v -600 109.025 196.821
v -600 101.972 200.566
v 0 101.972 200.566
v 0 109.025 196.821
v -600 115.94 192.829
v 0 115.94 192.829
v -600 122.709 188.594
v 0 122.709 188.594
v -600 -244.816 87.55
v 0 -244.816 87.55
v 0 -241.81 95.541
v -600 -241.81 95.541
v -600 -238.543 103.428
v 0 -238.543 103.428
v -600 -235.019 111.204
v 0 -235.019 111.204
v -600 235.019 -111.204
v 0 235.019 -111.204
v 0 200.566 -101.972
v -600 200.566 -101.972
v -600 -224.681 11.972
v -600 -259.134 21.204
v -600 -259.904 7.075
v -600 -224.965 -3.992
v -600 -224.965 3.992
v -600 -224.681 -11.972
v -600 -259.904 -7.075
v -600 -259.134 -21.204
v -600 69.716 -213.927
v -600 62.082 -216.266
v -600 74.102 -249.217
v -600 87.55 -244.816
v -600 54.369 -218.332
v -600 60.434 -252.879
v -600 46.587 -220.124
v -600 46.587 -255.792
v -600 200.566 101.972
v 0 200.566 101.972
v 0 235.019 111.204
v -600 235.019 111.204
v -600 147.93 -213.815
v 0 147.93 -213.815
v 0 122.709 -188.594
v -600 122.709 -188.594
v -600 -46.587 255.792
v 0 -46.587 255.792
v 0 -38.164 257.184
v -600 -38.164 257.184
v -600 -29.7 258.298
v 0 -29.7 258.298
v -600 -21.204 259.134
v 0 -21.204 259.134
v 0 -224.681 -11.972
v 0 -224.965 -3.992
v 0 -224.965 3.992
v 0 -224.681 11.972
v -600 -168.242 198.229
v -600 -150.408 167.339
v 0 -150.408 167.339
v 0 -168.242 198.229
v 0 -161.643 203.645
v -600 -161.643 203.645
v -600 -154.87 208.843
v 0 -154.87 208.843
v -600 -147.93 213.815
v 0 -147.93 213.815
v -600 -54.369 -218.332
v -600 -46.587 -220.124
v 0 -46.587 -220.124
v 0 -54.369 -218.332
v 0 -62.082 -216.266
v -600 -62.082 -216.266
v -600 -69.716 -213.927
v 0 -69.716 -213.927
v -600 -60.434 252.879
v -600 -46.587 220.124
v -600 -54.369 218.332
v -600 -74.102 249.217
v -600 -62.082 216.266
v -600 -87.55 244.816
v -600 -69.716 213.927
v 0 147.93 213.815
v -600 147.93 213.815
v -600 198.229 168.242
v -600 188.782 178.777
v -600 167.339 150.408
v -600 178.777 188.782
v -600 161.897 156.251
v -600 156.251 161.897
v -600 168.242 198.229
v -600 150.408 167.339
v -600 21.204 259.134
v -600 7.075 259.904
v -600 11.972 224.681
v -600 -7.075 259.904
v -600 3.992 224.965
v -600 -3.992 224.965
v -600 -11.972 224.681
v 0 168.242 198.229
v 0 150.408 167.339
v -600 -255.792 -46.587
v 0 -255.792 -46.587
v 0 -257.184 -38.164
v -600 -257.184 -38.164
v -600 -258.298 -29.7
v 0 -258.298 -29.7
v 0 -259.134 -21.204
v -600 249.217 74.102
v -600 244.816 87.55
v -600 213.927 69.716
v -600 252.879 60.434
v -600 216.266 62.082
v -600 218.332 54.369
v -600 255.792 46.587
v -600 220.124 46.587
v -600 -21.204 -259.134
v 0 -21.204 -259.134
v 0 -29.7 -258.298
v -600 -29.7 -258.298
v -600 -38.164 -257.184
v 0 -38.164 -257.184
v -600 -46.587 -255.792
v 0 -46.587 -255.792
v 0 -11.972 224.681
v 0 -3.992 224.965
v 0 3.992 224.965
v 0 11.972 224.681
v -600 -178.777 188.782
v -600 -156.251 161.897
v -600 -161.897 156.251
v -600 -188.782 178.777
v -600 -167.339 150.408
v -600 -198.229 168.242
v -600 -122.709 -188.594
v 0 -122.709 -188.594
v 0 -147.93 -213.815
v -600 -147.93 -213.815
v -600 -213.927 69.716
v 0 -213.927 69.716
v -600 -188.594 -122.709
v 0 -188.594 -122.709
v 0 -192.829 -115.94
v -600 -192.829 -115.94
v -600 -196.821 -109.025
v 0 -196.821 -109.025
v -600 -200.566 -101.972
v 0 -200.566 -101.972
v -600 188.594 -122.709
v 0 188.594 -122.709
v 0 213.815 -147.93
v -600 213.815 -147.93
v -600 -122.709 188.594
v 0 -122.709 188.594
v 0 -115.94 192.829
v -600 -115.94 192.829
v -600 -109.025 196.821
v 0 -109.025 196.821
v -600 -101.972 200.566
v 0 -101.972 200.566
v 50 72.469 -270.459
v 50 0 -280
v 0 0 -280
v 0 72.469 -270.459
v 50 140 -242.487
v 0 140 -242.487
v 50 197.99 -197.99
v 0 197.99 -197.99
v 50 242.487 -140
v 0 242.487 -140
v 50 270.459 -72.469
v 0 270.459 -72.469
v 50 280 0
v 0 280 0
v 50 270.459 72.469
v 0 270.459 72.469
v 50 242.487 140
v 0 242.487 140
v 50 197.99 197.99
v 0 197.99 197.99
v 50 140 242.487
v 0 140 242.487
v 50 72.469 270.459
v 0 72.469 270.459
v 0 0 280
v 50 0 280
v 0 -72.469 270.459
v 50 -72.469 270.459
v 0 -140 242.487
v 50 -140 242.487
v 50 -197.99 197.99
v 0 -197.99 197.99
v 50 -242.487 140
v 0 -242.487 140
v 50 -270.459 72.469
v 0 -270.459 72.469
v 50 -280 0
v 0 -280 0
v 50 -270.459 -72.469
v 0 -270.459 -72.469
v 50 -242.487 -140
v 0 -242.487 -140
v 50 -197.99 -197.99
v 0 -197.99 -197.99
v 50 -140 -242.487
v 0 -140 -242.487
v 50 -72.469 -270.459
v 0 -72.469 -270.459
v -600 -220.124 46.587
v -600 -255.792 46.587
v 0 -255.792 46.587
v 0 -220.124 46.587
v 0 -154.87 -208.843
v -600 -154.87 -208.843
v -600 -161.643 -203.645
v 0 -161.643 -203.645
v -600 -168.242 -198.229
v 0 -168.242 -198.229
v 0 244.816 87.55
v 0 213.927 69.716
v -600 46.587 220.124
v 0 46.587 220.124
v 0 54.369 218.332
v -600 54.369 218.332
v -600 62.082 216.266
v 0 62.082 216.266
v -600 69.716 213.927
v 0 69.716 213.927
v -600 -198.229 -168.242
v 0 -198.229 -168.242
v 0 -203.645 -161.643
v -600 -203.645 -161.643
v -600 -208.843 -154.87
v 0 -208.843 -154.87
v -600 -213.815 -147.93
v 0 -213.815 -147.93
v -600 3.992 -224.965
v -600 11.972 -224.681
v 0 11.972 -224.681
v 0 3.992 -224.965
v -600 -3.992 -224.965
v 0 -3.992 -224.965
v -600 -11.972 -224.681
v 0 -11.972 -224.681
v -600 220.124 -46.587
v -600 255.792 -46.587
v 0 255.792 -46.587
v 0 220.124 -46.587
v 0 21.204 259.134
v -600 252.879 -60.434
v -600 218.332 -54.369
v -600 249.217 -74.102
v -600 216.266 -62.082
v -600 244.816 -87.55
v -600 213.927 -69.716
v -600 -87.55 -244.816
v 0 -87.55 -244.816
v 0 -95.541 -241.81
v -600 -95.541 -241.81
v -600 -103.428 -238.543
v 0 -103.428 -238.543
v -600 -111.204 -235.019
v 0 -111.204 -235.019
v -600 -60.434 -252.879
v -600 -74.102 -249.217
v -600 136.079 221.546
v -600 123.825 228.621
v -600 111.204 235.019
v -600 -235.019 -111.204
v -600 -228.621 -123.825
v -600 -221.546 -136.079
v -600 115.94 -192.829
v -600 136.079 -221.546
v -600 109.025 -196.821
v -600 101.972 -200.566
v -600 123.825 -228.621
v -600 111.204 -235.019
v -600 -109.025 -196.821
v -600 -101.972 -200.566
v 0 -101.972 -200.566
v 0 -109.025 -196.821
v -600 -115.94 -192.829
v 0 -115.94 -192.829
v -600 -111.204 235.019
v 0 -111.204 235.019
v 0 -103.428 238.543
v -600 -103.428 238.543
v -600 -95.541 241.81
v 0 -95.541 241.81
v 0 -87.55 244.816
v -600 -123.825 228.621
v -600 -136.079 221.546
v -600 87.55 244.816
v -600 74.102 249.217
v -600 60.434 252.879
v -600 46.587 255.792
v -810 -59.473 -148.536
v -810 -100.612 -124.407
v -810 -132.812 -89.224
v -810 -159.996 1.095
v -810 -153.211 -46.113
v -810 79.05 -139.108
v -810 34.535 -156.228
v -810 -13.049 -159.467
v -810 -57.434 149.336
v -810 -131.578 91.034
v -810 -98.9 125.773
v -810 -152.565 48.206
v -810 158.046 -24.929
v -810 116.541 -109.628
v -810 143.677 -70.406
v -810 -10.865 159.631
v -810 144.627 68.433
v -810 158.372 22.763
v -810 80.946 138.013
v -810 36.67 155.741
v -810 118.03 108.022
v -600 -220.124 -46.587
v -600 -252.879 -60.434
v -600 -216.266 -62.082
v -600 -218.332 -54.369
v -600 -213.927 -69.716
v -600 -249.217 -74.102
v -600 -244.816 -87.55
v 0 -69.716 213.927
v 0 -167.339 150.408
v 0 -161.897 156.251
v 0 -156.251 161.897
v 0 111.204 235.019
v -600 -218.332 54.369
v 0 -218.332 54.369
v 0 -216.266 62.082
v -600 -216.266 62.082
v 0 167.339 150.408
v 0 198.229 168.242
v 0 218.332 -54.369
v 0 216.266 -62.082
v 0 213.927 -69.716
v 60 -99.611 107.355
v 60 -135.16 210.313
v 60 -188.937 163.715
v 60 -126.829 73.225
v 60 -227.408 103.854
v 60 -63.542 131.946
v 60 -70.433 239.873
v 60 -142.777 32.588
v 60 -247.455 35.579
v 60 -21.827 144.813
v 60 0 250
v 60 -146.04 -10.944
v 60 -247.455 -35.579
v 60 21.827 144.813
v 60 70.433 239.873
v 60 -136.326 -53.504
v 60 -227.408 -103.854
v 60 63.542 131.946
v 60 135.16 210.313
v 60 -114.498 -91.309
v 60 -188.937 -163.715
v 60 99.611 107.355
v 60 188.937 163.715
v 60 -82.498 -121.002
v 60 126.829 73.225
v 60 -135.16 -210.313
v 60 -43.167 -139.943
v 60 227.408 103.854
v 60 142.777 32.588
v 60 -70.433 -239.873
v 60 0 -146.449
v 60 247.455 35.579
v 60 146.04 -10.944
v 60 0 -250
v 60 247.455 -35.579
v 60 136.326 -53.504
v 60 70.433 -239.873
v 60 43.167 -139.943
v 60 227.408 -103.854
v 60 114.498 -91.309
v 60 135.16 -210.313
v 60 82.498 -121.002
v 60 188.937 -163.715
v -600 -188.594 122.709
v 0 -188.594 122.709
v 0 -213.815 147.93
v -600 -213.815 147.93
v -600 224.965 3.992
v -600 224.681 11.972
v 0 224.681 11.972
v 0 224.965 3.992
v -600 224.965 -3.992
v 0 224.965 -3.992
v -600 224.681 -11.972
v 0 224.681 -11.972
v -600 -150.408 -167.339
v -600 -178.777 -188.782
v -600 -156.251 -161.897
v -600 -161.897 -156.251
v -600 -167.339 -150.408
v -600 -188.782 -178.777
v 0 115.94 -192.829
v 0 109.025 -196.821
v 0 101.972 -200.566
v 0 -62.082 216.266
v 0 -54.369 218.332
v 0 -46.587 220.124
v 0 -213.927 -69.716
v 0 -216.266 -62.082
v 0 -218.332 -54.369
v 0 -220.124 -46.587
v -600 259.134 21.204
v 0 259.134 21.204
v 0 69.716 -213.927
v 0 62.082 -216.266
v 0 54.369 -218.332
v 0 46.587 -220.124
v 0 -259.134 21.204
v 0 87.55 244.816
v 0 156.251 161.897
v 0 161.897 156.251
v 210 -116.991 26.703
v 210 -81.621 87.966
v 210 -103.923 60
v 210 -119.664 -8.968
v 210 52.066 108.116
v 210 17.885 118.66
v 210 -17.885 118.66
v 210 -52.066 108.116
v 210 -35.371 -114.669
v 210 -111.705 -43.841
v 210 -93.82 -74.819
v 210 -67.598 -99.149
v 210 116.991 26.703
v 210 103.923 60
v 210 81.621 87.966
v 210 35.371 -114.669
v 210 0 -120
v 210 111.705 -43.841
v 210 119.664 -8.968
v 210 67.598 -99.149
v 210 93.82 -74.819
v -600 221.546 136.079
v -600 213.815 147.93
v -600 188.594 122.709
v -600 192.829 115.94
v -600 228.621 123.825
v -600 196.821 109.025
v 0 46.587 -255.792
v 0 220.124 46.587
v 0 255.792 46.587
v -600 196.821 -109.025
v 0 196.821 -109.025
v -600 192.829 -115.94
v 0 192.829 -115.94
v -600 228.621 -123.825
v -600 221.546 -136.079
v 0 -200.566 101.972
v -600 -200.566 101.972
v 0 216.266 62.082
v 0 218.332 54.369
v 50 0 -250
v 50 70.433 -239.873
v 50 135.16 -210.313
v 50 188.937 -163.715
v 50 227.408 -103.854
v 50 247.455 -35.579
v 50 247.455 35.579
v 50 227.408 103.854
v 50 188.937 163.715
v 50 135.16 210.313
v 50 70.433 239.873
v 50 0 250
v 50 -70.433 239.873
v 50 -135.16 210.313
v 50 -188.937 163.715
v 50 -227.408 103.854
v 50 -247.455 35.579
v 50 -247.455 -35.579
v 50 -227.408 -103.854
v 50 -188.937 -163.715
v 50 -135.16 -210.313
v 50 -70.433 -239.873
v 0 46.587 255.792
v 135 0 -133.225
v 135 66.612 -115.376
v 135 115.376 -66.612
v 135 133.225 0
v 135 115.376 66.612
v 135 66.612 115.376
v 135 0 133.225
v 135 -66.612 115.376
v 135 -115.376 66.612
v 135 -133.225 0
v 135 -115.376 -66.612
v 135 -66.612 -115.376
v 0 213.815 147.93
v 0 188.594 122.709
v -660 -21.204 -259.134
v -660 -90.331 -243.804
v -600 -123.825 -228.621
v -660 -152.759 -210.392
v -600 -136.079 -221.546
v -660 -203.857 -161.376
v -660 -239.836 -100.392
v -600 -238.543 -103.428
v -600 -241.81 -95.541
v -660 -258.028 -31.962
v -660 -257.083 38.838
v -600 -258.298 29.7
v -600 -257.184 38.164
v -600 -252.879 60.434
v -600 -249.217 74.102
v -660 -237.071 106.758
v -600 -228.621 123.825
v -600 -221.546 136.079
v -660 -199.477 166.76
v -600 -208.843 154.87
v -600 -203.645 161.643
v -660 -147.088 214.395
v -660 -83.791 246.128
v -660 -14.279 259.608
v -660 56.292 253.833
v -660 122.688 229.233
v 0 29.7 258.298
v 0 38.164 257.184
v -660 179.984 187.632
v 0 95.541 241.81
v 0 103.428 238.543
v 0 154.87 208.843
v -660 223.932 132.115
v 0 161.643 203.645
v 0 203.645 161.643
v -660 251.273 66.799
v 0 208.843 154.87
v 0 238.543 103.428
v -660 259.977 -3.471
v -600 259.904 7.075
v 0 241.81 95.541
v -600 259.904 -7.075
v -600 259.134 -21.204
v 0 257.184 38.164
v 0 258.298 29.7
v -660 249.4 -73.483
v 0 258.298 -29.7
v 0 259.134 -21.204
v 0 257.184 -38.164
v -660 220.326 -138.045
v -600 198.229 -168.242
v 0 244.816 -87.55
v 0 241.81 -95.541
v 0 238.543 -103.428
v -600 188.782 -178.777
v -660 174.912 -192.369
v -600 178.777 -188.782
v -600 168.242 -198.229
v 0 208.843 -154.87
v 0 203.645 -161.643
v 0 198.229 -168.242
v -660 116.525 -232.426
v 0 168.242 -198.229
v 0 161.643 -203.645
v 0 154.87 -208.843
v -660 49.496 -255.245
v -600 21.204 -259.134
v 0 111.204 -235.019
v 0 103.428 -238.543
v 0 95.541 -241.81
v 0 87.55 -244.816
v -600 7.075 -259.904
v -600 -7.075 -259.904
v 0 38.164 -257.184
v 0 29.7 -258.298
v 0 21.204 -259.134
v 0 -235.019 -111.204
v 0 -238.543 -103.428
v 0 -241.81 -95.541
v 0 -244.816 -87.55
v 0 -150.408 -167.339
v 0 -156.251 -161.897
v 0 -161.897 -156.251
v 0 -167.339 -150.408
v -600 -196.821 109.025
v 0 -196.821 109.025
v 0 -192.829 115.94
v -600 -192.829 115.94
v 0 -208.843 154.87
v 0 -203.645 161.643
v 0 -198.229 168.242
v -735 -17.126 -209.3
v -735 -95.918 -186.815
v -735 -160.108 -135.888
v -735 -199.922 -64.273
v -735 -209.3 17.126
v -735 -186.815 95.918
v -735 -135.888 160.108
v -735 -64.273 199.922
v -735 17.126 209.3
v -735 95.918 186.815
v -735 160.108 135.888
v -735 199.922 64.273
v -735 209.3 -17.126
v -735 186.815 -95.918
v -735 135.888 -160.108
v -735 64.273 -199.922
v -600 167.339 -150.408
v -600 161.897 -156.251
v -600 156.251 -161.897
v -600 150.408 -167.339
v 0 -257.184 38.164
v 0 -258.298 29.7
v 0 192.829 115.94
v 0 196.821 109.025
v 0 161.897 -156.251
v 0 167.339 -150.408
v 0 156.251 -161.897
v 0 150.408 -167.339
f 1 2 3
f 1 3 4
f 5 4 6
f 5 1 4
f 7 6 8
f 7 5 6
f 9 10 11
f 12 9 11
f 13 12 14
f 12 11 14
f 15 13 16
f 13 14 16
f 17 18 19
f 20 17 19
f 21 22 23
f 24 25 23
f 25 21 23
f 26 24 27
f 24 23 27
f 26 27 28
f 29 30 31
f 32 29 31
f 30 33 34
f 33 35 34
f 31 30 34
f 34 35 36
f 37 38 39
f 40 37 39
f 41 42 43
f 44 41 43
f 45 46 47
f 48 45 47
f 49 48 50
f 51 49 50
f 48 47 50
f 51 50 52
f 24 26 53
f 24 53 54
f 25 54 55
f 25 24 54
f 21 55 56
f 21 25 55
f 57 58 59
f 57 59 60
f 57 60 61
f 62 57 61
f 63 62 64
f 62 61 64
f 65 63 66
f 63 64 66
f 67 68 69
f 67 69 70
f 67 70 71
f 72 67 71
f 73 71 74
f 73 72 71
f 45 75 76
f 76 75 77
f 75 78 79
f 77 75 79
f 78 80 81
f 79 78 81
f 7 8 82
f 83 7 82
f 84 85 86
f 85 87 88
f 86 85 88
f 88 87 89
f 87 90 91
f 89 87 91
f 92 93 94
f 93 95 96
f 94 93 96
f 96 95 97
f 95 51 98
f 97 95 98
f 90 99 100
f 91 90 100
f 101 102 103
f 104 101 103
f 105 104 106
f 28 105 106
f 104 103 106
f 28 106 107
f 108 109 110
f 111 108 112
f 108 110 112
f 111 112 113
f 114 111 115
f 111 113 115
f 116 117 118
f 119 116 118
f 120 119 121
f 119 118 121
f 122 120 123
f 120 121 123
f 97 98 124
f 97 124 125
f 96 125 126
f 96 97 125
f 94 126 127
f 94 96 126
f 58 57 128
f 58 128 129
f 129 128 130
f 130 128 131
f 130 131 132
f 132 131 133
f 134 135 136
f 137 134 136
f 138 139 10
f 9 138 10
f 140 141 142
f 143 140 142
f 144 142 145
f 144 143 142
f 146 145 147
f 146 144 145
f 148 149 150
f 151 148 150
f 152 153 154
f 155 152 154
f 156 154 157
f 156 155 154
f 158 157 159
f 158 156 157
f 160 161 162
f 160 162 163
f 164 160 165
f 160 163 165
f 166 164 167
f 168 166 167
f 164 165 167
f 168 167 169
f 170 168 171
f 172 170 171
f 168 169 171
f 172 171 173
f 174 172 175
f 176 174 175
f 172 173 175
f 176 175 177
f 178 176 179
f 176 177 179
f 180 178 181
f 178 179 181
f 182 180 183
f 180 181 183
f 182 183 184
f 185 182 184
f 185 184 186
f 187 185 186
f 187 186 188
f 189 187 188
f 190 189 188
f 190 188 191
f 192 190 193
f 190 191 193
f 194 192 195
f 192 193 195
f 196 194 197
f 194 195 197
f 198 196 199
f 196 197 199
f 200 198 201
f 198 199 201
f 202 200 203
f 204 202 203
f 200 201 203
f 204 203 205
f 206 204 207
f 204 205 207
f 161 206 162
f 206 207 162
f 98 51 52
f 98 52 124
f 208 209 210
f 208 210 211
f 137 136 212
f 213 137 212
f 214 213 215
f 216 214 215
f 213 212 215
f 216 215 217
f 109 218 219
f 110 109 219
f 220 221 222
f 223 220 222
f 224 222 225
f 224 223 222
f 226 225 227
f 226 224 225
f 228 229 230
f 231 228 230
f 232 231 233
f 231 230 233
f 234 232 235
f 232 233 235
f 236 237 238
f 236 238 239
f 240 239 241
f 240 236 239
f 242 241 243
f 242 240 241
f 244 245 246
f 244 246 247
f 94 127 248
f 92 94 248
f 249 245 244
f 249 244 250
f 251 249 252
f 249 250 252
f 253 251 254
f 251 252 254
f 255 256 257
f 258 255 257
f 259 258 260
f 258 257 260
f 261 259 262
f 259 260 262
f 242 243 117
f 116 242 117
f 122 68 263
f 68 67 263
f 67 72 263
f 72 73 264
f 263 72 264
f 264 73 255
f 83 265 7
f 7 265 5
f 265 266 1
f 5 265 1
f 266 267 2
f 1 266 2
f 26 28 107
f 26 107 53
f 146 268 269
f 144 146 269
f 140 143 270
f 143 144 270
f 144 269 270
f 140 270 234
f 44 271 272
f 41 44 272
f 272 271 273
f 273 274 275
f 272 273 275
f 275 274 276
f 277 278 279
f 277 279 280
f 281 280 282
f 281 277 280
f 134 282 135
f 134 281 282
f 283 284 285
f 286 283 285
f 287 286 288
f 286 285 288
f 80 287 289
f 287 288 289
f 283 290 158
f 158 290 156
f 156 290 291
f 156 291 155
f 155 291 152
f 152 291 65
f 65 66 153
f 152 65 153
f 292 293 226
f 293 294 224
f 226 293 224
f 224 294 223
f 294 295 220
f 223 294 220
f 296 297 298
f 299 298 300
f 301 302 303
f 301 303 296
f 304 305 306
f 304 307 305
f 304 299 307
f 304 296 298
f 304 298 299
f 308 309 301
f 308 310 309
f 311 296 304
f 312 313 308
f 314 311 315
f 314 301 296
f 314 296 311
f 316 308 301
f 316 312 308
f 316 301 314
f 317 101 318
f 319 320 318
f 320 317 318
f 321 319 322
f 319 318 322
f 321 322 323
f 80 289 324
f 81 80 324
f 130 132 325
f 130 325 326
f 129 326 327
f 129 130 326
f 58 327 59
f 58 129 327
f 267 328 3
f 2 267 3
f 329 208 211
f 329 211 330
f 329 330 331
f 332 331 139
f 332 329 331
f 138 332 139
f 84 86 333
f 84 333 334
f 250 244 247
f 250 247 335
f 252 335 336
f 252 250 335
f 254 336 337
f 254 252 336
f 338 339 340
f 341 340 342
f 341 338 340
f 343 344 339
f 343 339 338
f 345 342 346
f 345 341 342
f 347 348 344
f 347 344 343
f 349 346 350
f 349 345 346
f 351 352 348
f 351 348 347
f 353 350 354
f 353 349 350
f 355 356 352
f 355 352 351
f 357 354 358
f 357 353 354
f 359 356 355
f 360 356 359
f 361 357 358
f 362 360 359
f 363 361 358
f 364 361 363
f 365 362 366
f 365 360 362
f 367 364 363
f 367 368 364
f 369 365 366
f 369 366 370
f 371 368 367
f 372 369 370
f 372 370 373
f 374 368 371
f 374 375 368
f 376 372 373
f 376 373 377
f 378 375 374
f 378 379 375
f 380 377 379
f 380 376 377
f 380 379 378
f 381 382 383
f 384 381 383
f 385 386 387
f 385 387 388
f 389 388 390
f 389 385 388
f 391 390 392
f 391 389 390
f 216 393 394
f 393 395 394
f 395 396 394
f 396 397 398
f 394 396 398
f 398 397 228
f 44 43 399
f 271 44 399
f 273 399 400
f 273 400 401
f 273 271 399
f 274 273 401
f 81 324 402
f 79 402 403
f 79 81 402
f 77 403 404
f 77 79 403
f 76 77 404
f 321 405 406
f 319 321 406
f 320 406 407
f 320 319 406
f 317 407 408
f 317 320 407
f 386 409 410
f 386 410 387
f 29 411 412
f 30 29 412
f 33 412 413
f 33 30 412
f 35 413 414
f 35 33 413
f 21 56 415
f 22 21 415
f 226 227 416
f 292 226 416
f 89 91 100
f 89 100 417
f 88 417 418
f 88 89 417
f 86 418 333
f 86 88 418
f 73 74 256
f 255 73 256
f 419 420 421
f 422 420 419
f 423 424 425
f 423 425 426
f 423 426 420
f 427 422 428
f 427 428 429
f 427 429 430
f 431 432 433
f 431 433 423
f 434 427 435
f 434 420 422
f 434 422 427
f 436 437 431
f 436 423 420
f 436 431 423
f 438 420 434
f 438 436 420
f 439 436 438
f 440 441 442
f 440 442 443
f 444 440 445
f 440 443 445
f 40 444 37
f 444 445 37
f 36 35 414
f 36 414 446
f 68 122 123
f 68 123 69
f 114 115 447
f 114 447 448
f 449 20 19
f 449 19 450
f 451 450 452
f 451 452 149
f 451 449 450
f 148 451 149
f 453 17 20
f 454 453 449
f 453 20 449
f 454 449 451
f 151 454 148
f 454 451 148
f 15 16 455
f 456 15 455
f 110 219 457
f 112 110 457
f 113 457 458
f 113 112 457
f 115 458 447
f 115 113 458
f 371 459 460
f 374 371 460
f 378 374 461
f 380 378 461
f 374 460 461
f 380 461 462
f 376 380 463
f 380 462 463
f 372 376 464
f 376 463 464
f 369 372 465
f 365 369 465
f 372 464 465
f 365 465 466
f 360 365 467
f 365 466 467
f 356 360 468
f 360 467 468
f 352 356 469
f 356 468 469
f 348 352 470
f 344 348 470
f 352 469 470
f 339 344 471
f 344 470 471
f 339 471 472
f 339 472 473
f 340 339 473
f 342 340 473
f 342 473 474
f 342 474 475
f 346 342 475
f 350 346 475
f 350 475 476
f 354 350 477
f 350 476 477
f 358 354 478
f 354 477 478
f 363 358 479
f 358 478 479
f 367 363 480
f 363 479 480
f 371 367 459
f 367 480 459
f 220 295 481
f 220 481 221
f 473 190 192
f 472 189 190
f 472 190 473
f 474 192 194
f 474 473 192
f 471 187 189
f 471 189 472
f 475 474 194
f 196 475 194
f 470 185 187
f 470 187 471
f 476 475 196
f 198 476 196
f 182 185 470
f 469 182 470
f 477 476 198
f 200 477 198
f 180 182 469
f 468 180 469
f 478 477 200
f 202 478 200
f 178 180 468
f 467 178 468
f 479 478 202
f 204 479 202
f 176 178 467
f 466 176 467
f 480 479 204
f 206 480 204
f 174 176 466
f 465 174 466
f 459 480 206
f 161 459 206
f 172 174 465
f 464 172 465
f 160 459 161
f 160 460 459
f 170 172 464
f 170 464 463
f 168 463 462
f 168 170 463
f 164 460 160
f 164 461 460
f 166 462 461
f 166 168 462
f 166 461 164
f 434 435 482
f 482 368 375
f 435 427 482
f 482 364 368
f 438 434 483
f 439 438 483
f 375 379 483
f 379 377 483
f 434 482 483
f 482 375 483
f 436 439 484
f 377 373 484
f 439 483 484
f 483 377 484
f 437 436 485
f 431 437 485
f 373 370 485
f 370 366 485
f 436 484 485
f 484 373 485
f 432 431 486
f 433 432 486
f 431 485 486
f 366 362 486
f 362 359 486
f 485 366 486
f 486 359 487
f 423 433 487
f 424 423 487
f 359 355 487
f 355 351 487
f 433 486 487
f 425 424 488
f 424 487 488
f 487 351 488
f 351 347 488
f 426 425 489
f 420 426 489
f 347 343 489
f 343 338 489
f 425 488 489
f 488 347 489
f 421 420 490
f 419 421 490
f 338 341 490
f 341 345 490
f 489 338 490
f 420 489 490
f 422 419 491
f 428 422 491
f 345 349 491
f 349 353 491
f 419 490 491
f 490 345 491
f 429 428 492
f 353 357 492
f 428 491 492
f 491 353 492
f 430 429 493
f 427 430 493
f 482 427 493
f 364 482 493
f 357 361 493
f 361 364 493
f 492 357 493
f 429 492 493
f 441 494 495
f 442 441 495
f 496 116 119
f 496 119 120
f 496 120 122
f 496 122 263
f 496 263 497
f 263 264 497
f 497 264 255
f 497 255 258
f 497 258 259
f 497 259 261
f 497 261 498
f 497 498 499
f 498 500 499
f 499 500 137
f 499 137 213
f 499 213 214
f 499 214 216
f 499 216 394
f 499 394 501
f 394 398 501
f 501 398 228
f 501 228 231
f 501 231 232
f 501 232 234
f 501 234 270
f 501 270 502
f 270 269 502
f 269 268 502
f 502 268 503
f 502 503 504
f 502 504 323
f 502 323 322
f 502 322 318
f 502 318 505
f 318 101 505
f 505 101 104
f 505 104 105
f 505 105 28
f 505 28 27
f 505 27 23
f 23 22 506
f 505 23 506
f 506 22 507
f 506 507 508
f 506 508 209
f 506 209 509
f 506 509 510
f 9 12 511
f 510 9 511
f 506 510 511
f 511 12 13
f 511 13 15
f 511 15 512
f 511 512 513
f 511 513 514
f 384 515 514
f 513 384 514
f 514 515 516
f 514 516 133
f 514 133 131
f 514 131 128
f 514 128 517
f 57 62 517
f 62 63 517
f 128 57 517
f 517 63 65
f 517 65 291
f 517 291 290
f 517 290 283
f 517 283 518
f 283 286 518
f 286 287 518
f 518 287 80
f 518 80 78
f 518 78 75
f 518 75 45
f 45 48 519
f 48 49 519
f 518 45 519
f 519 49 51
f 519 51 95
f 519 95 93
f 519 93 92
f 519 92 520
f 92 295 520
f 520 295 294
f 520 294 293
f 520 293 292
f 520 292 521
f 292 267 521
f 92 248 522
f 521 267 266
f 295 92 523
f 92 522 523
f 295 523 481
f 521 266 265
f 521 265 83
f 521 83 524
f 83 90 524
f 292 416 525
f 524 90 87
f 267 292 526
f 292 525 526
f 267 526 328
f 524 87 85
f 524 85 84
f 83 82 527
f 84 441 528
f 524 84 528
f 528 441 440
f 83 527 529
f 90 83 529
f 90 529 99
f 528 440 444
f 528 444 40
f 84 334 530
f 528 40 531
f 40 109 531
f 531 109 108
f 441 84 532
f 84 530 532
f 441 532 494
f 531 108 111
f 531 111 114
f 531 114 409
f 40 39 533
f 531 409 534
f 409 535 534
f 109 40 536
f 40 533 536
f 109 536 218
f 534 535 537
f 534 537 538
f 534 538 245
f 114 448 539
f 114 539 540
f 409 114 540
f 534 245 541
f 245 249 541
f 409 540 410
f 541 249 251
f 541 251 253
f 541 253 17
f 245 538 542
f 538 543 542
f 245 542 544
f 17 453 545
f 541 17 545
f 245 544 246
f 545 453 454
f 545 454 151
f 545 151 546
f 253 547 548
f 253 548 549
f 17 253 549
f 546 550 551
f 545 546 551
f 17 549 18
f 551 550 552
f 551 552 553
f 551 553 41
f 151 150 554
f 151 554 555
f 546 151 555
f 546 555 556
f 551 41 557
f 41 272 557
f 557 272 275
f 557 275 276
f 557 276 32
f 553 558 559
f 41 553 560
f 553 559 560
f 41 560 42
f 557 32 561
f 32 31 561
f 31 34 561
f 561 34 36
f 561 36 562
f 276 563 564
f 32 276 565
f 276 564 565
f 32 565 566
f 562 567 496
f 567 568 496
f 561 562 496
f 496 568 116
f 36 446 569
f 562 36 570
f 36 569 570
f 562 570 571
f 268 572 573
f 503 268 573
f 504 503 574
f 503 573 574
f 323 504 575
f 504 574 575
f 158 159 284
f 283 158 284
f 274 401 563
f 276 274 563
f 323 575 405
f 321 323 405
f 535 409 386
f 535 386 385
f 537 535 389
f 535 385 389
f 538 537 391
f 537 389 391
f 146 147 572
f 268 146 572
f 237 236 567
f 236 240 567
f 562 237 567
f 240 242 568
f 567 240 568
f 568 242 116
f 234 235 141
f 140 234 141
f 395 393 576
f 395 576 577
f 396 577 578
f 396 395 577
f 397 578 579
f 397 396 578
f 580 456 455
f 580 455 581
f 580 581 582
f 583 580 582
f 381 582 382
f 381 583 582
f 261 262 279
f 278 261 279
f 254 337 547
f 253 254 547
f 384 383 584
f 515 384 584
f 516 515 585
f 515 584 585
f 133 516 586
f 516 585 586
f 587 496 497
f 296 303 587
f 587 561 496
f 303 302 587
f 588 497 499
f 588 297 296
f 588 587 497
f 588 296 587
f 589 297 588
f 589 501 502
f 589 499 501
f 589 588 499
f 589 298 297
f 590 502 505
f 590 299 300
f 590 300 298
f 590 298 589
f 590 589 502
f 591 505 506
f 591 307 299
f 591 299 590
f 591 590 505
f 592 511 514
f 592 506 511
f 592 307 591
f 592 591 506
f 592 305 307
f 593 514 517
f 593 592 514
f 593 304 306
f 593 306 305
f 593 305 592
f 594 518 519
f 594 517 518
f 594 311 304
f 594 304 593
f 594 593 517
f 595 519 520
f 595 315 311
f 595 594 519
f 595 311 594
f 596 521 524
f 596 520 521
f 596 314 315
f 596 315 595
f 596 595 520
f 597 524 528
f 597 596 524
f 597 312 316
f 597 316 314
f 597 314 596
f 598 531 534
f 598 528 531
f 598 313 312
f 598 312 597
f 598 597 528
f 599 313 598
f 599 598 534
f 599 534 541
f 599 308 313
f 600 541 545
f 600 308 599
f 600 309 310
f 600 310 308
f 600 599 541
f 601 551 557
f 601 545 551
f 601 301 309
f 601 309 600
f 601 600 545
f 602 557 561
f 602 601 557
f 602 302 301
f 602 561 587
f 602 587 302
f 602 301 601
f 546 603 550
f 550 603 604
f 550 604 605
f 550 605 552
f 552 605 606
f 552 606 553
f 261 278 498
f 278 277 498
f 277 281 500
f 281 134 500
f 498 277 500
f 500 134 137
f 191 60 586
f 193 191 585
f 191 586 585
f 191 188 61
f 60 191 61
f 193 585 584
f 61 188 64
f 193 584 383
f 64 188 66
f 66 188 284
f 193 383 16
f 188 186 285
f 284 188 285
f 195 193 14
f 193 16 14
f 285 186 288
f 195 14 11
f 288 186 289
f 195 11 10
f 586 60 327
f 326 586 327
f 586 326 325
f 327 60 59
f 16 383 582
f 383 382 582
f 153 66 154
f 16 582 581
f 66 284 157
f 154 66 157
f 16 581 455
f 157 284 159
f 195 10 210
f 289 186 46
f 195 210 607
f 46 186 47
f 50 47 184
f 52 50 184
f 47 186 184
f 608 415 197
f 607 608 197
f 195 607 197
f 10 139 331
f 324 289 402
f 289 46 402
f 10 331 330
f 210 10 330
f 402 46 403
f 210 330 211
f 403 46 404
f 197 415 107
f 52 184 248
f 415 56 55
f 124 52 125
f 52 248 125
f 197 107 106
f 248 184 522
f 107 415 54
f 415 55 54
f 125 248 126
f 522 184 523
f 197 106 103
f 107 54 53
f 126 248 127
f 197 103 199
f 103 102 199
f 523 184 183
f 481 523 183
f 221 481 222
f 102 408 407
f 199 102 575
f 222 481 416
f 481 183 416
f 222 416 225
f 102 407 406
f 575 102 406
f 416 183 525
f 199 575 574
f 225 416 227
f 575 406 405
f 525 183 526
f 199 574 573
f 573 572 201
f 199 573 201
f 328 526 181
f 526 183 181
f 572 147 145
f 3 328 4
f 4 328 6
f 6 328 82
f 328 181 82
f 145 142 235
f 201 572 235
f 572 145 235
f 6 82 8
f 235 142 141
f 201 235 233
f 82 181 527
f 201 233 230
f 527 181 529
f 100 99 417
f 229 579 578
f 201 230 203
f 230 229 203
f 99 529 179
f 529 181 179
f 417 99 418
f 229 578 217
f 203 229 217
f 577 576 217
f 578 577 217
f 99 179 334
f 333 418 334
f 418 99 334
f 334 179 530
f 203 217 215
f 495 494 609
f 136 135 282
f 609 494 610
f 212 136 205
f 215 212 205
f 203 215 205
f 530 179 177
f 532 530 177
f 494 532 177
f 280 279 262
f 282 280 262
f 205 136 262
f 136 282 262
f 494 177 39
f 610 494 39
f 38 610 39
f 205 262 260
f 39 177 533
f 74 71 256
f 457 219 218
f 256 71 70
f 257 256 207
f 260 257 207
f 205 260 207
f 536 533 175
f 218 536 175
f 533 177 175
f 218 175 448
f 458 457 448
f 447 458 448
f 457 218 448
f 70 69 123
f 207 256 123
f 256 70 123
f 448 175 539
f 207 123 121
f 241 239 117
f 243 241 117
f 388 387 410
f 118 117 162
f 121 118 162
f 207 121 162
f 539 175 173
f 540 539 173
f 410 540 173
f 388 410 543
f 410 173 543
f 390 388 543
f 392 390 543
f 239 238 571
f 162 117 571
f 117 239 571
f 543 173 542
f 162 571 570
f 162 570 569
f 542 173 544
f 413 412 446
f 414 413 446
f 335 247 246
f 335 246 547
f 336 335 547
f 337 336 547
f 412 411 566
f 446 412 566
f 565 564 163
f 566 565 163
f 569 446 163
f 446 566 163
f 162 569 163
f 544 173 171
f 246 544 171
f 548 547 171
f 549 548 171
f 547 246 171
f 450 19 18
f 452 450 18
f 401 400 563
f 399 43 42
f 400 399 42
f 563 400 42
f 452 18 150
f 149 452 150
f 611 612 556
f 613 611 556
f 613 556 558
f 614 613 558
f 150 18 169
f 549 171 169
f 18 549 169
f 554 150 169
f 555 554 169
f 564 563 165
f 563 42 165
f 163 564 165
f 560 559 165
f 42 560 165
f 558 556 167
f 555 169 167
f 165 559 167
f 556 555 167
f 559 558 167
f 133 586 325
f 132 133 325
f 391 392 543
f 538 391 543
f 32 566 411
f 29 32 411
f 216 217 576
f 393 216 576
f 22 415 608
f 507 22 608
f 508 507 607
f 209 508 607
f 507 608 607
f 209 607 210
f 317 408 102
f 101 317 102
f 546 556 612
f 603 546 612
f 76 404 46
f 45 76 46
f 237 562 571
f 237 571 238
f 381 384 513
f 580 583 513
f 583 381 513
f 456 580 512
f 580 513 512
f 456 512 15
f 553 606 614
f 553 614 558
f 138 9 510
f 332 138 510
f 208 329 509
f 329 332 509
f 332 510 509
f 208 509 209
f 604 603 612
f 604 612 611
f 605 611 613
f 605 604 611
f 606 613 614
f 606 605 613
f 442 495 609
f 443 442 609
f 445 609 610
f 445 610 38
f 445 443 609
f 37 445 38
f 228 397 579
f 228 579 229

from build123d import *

# Parameters (mm, degrees)
SKETCH1_R           = 280
BOSS_EXTRUDE1_DEPTH = 50
SKETCH2_R           = 250
BOSS_EXTRUDE2_DEPTH = 10
SKETCH3_R           = 120
BOSS_EXTRUDE3_DEPTH = 150
DRAFT1_ANGLE        = 10
SKETCH4_R           = 260
BOSS_EXTRUDE4_DEPTH = 600
CUT_EXTRUDE1_START  = -600
CUT_EXTRUDE1_DEPTH  = 600
SKETCH6_R           = 225
BOSS_EXTRUDE5_DEPTH = 600
SKETCH7_R           = 260
BOSS_EXTRUDE6_DEPTH = 60
SKETCH9_R           = 160


with BuildPart() as part:
    # Sketch1 → Boss-Extrude1 (new body)
    with BuildSketch(Plane(origin=(0, 0, 0), x_dir=(0, 0, -1), z_dir=(1, 0, 0))):
        Circle(SKETCH1_R)
    extrude(amount=BOSS_EXTRUDE1_DEPTH)

    # Sketch2 → Boss-Extrude2 (add)
    with BuildSketch(Plane(origin=(50, 0, 0), x_dir=(0, 0, -1), z_dir=(1, 0, 0))):
        Circle(SKETCH2_R)
    extrude(amount=BOSS_EXTRUDE2_DEPTH)

    # Sketch3 → Boss-Extrude3 (add)
    with BuildSketch(Plane(origin=(60, 0, 0), x_dir=(0, 0, -1), z_dir=(1, 0, 0))):
        Circle(SKETCH3_R)
    extrude(amount=BOSS_EXTRUDE3_DEPTH)

    # Draft1
    draft1_faces = [part.faces().sort_by_distance(p)[0] for p in [
        (135, 0, 120),
    ]]
    draft(draft1_faces, Plane(origin=(210, 0, 0), x_dir=(0, 0, 1), z_dir=(1, 0, 0)), DRAFT1_ANGLE)

    # Sketch4 → Boss-Extrude4 (add)
    with BuildSketch(Plane.ZY):
        Circle(SKETCH4_R)
    extrude(amount=BOSS_EXTRUDE4_DEPTH)

    # Sketch5 → Cut-Extrude1 (cut)
    with BuildSketch(Plane.ZY.offset(600).offset(CUT_EXTRUDE1_START)):
        with BuildLine():
            Line((87.550166574, 244.816192955), (46.587428118, 173.866648732))
            Line((46.587428118, 173.866648732), (46.587428118, 255.792125644))
            ThreePointArc((46.587428118, 255.792125644), (67.292951727, 251.140714835), (87.550166574, 244.816192955))
        make_face()
        with BuildLine():
            Line((21.203873704, 259.13393398), (0, 180))
            Line((0, 180), (-21.203873704, 259.13393398))
            ThreePointArc((-21.203873704, 259.13393398), (0, 260), (21.203873704, 259.13393398))
        make_face()
        with BuildLine():
            Line((147.930060276, 213.814632957), (90, 155.884572681))
            Line((90, 155.884572681), (111.203873704, 235.018506661))
            ThreePointArc((111.203873704, 235.018506661), (130, 225.166604984), (147.930060276, 213.814632957))
        make_face()
        with BuildLine():
            Line((198.228764836, 168.241959069), (127.279220614, 127.279220614))
            Line((127.279220614, 127.279220614), (168.241959069, 198.228764836))
            ThreePointArc((168.241959069, 198.228764836), (183.847763109, 183.847763109), (198.228764836, 168.241959069))
        make_face()
        with BuildLine():
            Line((235.018506661, 111.203873704), (155.884572681, 90))
            Line((155.884572681, 90), (213.814632957, 147.930060276))
            ThreePointArc((213.814632957, 147.930060276), (225.166604984, 130), (235.018506661, 111.203873704))
        make_face()
        with BuildLine():
            Line((255.792125644, 46.587428118), (173.866648732, 46.587428118))
            Line((173.866648732, 46.587428118), (244.816192955, 87.550166574))
            ThreePointArc((244.816192955, 87.550166574), (251.140714835, 67.292951727), (255.792125644, 46.587428118))
        make_face()
        with BuildLine():
            Line((259.13393398, -21.203873704), (180, 0))
            Line((180, 0), (259.13393398, 21.203873704))
            ThreePointArc((259.13393398, 21.203873704), (260, 0), (259.13393398, -21.203873704))
        make_face()
        with BuildLine():
            Line((244.816192955, -87.550166574), (173.866648732, -46.587428118))
            Line((173.866648732, -46.587428118), (255.792125644, -46.587428118))
            ThreePointArc((255.792125644, -46.587428118), (251.140714835, -67.292951727), (244.816192955, -87.550166574))
        make_face()
        with BuildLine():
            Line((213.814632957, -147.930060276), (155.884572681, -90))
            Line((155.884572681, -90), (235.018506661, -111.203873704))
            ThreePointArc((235.018506661, -111.203873704), (225.166604984, -130), (213.814632957, -147.930060276))
        make_face()
        with BuildLine():
            Line((168.241959069, -198.228764836), (127.279220614, -127.279220614))
            Line((127.279220614, -127.279220614), (198.228764836, -168.241959069))
            ThreePointArc((198.228764836, -168.241959069), (183.847763109, -183.847763109), (168.241959069, -198.228764836))
        make_face()
        with BuildLine():
            Line((111.203873704, -235.018506661), (90, -155.884572681))
            Line((90, -155.884572681), (147.930060276, -213.814632957))
            ThreePointArc((147.930060276, -213.814632957), (130, -225.166604984), (111.203873704, -235.018506661))
        make_face()
        with BuildLine():
            Line((46.587428118, -255.792125644), (46.587428118, -173.866648732))
            Line((46.587428118, -173.866648732), (87.550166574, -244.816192955))
            ThreePointArc((87.550166574, -244.816192955), (67.292951727, -251.140714835), (46.587428118, -255.792125644))
        make_face()
        with BuildLine():
            Line((-21.203873704, -259.13393398), (0, -180))
            Line((0, -180), (21.203873704, -259.13393398))
            ThreePointArc((21.203873704, -259.13393398), (0, -260), (-21.203873704, -259.13393398))
        make_face()
        with BuildLine():
            Line((-87.550166574, -244.816192955), (-46.587428118, -173.866648732))
            Line((-46.587428118, -173.866648732), (-46.587428118, -255.792125644))
            ThreePointArc((-46.587428118, -255.792125644), (-67.292951727, -251.140714835), (-87.550166574, -244.816192955))
        make_face()
        with BuildLine():
            Line((-147.930060276, -213.814632957), (-90, -155.884572681))
            Line((-90, -155.884572681), (-111.203873704, -235.018506661))
            ThreePointArc((-111.203873704, -235.018506661), (-130, -225.166604984), (-147.930060276, -213.814632957))
        make_face()
        with BuildLine():
            Line((-198.228764836, -168.241959069), (-127.279220614, -127.279220614))
            Line((-127.279220614, -127.279220614), (-168.241959069, -198.228764836))
            ThreePointArc((-168.241959069, -198.228764836), (-183.847763109, -183.847763109), (-198.228764836, -168.241959069))
        make_face()
        with BuildLine():
            Line((-235.018506661, -111.203873704), (-155.884572681, -90))
            Line((-155.884572681, -90), (-213.814632957, -147.930060276))
            ThreePointArc((-213.814632957, -147.930060276), (-225.166604984, -130), (-235.018506661, -111.203873704))
        make_face()
        with BuildLine():
            Line((-255.792125644, -46.587428118), (-173.866648732, -46.587428118))
            Line((-173.866648732, -46.587428118), (-244.816192955, -87.550166574))
            ThreePointArc((-244.816192955, -87.550166574), (-251.140714835, -67.292951727), (-255.792125644, -46.587428118))
        make_face()
        with BuildLine():
            Line((-259.13393398, 21.203873704), (-180, 0))
            Line((-180, 0), (-259.13393398, -21.203873704))
            ThreePointArc((-259.13393398, -21.203873704), (-260, 0), (-259.13393398, 21.203873704))
        make_face()
        with BuildLine():
            Line((-244.816192955, 87.550166574), (-173.866648732, 46.587428118))
            Line((-173.866648732, 46.587428118), (-255.792125644, 46.587428118))
            ThreePointArc((-255.792125644, 46.587428118), (-251.140714835, 67.292951727), (-244.816192955, 87.550166574))
        make_face()
        with BuildLine():
            Line((-213.814632957, 147.930060276), (-155.884572681, 90))
            Line((-155.884572681, 90), (-235.018506661, 111.203873704))
            ThreePointArc((-235.018506661, 111.203873704), (-225.166604984, 130), (-213.814632957, 147.930060276))
        make_face()
        with BuildLine():
            Line((-168.241959069, 198.228764836), (-127.279220614, 127.279220614))
            Line((-127.279220614, 127.279220614), (-198.228764836, 168.241959069))
            ThreePointArc((-198.228764836, 168.241959069), (-183.847763109, 183.847763109), (-168.241959069, 198.228764836))
        make_face()
        with BuildLine():
            Line((-111.203873704, 235.018506661), (-90, 155.884572681))
            Line((-90, 155.884572681), (-147.930060276, 213.814632957))
            ThreePointArc((-147.930060276, 213.814632957), (-130, 225.166604984), (-111.203873704, 235.018506661))
        make_face()
        with BuildLine():
            Line((-46.587428118, 255.792125644), (-46.587428118, 173.866648732))
            Line((-46.587428118, 173.866648732), (-87.550166574, 244.816192955))
            ThreePointArc((-87.550166574, 244.816192955), (-67.292951727, 251.140714835), (-46.587428118, 255.792125644))
        make_face()
    extrude(amount=CUT_EXTRUDE1_DEPTH, mode=Mode.SUBTRACT)

    # Sketch6 → Boss-Extrude5 (add)
    with BuildSketch(Plane.ZY.offset(600)):
        Circle(SKETCH6_R)
    extrude(amount=-BOSS_EXTRUDE5_DEPTH)

    # Sketch7 → Boss-Extrude6 (add)
    with BuildSketch(Plane.ZY.offset(600)):
        with Locations(Location((0, 0, 0), (0, 0, 184.677858529))):
            Circle(SKETCH7_R)
    extrude(amount=BOSS_EXTRUDE6_DEPTH)

    # Sketch9 → section 1 of loft1
    with BuildSketch(Plane.ZY.offset(810), mode=Mode.PRIVATE) as loft1_s1:
        Circle(SKETCH9_R)
    # loft from a face of the part (loft1)
    loft([part.faces().sort_by_distance((-660, 0, 0))[0], loft1_s1.sketch])


solid = part.part
